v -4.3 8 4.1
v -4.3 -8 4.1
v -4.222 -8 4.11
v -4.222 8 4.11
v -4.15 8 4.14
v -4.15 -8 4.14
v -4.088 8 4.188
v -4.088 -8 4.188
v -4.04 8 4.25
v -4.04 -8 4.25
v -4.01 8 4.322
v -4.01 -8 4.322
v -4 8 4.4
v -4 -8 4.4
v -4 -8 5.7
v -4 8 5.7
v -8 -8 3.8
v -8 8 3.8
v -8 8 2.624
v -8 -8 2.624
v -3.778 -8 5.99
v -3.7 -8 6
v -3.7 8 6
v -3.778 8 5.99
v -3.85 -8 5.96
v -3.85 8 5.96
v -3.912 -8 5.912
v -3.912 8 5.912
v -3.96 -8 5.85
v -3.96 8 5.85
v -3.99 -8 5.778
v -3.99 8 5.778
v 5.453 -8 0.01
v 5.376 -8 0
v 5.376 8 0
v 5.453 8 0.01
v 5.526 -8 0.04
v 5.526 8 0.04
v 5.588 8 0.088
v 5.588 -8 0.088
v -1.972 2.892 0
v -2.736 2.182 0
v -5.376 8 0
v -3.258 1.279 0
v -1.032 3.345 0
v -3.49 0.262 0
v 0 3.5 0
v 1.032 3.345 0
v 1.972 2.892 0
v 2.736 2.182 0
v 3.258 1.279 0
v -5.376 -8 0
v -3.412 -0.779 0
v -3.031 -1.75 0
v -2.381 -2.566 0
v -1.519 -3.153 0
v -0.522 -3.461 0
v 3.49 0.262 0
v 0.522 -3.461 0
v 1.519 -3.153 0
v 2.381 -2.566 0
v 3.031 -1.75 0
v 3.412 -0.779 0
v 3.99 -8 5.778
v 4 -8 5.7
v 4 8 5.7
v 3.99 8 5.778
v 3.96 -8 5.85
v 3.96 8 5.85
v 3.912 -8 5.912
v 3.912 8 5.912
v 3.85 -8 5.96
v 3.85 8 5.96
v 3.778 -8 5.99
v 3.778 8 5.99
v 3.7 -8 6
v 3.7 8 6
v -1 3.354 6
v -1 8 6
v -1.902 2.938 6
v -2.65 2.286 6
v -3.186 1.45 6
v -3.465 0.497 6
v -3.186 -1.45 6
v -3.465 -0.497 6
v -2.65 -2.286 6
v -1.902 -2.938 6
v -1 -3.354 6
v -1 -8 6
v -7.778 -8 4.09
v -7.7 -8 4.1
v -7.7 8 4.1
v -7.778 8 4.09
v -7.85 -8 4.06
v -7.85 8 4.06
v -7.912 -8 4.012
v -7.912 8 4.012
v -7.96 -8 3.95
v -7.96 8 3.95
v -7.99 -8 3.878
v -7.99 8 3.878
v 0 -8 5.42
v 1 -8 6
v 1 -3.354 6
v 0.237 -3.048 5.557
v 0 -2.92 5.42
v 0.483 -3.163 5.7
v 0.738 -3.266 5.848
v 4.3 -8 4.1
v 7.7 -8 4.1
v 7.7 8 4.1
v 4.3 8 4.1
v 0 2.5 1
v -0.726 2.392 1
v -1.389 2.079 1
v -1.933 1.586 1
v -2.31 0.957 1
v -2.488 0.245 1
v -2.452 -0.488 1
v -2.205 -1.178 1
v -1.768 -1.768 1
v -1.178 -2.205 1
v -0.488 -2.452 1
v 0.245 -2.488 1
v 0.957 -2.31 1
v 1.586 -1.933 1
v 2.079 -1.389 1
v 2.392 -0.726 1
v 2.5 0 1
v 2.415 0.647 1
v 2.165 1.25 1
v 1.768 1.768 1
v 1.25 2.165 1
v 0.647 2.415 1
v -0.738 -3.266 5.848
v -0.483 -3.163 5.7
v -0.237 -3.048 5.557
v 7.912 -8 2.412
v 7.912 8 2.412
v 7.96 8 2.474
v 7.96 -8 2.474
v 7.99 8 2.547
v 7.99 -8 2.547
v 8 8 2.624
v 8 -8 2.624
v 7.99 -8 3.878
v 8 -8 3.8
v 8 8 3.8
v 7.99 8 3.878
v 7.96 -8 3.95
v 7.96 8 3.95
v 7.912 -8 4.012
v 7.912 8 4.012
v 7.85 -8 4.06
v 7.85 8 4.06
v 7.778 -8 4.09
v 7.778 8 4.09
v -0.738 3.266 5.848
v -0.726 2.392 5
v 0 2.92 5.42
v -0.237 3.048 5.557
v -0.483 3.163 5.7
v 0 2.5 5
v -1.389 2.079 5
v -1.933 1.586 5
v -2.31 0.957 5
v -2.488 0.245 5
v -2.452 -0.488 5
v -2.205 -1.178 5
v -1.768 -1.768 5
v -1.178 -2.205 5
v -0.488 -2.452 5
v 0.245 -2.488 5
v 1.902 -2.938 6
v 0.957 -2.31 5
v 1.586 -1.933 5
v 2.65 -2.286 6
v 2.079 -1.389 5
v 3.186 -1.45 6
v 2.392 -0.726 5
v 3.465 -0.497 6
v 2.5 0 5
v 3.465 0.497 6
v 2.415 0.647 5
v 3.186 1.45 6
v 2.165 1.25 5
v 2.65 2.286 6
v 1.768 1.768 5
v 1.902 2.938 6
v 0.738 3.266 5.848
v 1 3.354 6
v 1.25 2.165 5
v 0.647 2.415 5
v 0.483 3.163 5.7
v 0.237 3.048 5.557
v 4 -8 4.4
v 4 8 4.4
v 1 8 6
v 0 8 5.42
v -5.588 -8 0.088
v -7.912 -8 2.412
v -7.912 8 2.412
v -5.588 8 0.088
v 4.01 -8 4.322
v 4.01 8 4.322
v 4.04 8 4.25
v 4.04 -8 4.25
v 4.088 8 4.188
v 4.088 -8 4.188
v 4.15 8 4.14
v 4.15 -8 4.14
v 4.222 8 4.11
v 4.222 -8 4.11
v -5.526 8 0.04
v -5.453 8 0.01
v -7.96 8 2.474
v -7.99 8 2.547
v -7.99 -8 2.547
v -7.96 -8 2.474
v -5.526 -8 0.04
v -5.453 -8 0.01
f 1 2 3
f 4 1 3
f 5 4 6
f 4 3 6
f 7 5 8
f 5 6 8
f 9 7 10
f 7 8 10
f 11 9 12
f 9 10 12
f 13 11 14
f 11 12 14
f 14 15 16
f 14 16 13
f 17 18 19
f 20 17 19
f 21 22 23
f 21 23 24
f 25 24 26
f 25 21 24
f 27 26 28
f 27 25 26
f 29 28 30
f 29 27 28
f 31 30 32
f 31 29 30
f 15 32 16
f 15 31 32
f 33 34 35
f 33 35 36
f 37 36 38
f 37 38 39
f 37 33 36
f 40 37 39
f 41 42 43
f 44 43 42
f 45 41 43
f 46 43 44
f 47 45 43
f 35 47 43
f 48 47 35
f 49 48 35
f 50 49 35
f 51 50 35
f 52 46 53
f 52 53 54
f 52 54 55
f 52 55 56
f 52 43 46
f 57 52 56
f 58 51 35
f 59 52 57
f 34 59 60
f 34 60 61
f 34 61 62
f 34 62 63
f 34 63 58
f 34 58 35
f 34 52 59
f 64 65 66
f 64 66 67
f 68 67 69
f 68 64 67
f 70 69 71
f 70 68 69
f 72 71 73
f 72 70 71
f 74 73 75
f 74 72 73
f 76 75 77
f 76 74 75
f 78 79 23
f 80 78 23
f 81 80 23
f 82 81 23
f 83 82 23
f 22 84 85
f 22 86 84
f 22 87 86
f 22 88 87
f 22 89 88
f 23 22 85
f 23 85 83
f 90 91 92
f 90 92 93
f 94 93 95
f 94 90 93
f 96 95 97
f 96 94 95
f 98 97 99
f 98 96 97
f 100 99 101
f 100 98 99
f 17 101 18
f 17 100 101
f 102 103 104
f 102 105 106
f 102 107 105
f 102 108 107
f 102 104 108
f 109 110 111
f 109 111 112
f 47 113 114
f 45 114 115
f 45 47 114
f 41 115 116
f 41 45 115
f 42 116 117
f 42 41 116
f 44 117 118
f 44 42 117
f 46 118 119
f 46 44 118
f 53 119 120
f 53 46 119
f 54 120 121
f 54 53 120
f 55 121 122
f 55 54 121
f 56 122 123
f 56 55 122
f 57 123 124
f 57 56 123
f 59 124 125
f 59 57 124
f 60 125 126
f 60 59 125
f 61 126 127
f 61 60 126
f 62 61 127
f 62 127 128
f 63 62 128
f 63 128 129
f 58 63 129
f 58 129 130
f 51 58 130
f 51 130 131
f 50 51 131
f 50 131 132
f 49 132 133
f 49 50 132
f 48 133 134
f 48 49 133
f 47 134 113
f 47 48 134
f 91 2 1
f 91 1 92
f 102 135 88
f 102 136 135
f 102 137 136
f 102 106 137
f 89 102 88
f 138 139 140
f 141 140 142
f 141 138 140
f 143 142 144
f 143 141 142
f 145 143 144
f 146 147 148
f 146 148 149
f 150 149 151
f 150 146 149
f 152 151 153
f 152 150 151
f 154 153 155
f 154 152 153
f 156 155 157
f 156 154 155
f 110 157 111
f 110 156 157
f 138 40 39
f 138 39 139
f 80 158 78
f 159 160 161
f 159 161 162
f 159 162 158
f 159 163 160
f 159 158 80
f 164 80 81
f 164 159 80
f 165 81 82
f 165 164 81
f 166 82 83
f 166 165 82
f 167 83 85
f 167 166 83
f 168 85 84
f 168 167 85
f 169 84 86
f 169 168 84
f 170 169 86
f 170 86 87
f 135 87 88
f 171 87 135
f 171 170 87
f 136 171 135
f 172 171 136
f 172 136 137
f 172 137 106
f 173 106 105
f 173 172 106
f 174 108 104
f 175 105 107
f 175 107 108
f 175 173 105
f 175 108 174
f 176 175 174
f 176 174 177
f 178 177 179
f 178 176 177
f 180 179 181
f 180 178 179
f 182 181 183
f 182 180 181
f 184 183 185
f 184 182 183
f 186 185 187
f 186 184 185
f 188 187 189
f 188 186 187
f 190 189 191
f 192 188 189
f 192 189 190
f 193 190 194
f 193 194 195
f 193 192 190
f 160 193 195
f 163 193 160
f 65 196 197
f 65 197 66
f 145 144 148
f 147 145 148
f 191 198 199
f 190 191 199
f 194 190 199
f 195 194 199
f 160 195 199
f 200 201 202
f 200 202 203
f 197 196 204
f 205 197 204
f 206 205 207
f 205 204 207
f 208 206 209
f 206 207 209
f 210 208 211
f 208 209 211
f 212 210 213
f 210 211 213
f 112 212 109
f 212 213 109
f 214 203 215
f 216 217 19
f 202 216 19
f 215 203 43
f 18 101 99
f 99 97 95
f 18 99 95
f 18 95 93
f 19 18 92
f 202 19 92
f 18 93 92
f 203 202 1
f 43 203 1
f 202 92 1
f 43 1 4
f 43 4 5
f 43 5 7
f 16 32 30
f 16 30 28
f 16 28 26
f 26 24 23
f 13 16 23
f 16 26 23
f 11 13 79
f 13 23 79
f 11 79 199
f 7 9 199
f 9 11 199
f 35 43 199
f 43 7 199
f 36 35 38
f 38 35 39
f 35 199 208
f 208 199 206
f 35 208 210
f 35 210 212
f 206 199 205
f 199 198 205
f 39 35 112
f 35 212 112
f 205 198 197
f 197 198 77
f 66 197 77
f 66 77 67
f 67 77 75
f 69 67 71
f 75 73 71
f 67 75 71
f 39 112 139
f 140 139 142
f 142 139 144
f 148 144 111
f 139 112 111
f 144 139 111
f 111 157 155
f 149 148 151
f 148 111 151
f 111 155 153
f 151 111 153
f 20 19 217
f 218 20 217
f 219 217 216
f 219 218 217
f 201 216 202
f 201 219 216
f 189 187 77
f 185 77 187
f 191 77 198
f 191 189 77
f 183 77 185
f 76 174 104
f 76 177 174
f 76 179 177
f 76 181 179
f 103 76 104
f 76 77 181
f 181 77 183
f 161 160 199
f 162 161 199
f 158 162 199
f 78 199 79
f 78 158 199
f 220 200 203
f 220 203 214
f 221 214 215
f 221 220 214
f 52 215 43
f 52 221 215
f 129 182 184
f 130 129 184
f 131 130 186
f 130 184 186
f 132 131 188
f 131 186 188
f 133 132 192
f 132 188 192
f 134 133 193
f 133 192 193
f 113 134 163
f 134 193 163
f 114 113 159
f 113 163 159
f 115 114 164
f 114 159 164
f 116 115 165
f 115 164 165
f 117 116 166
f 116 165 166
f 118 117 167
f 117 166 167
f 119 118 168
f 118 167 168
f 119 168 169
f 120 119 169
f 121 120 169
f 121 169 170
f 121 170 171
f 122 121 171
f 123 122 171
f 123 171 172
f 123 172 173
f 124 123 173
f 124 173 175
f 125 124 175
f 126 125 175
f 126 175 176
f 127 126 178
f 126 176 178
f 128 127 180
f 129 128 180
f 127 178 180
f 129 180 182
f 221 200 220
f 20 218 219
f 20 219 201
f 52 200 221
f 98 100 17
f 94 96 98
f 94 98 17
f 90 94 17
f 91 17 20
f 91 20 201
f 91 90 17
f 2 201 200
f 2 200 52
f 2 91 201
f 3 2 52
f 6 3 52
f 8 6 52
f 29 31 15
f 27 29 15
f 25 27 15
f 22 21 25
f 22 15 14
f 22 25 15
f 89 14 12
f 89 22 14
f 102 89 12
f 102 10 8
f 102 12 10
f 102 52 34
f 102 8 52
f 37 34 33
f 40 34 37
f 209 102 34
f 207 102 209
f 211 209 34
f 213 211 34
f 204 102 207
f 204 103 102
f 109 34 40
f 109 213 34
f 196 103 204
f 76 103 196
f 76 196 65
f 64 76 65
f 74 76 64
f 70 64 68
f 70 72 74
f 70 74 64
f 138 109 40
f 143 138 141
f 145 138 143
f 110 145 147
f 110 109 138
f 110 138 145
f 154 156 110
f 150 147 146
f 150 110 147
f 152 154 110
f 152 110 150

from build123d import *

# Parameters (mm, degrees)
PAD_DEPTH   = 8
SKETCH001_R = 2.5
HOLE_DEPTH  = 6.001


with BuildPart() as part:
    # Sketch → Pad (new body, symmetric)
    with BuildSketch(Plane.XZ):
        with BuildLine():
            Line((-1, 6), (-3.7, 6))
            ThreePointArc((-3.7, 6), (-3.912132, 5.912132), (-4, 5.7))
            Line((-4, 5.7), (-4, 4.4))
            ThreePointArc((-4.3, 4.1), (-4.087868, 4.187868), (-4, 4.4))
            Line((-4.3, 4.1), (-7.7, 4.1))
            ThreePointArc((-7.7, 4.1), (-7.912132, 4.012132), (-8, 3.8))
            Line((-8, 3.8), (-8, 2.624264))
            ThreePointArc((-8, 2.624264), (-7.977164, 2.509459), (-7.912132, 2.412132))
            Line((-7.912132, 2.412132), (-5.587868, 0.087868))
            ThreePointArc((-5.587868, 0.087868), (-5.490541, 0.022836), (-5.375736, 0))
            Line((-5.375736, 0), (5.375736, 0))
            ThreePointArc((5.375736, 0), (5.490541, 0.022836), (5.587868, 0.087868))
            Line((5.587868, 0.087868), (7.912132, 2.412132))
            ThreePointArc((7.912132, 2.412132), (7.977164, 2.509459), (8, 2.624264))
            Line((8, 2.624264), (8, 3.8))
            ThreePointArc((8, 3.8), (7.912132, 4.012132), (7.7, 4.1))
            Line((7.7, 4.1), (4.3, 4.1))
            ThreePointArc((4, 4.4), (4.087868, 4.187868), (4.3, 4.1))
            Line((4, 4.4), (4, 5.7))
            ThreePointArc((4, 5.7), (3.912132, 5.912132), (3.7, 6))
            Line((3.7, 6), (1, 6))
            Line((1, 6), (0, 5.42))
            Line((0, 5.42), (-1, 6))
        make_face()
    extrude(amount=PAD_DEPTH, both=True)

    # Sketch001 → Hole (cut, through all)
    with BuildSketch(Plane.XY.offset(6)):
        Circle(SKETCH001_R)
    extrude(amount=-HOLE_DEPTH, mode=Mode.SUBTRACT)

    # Sketch002 → Groove (revolve, cut)
    with BuildSketch(Plane.YZ):
        Polygon((2.5, 6), (3.5, 6), (2.5, 5), align=None)
        Polygon((2.5, 0), (2.5, 1), (3.5, 0), align=None)
    revolve(axis=Axis((0, 0, 0), (0, 0, 1)), mode=Mode.SUBTRACT)


solid = part.part
